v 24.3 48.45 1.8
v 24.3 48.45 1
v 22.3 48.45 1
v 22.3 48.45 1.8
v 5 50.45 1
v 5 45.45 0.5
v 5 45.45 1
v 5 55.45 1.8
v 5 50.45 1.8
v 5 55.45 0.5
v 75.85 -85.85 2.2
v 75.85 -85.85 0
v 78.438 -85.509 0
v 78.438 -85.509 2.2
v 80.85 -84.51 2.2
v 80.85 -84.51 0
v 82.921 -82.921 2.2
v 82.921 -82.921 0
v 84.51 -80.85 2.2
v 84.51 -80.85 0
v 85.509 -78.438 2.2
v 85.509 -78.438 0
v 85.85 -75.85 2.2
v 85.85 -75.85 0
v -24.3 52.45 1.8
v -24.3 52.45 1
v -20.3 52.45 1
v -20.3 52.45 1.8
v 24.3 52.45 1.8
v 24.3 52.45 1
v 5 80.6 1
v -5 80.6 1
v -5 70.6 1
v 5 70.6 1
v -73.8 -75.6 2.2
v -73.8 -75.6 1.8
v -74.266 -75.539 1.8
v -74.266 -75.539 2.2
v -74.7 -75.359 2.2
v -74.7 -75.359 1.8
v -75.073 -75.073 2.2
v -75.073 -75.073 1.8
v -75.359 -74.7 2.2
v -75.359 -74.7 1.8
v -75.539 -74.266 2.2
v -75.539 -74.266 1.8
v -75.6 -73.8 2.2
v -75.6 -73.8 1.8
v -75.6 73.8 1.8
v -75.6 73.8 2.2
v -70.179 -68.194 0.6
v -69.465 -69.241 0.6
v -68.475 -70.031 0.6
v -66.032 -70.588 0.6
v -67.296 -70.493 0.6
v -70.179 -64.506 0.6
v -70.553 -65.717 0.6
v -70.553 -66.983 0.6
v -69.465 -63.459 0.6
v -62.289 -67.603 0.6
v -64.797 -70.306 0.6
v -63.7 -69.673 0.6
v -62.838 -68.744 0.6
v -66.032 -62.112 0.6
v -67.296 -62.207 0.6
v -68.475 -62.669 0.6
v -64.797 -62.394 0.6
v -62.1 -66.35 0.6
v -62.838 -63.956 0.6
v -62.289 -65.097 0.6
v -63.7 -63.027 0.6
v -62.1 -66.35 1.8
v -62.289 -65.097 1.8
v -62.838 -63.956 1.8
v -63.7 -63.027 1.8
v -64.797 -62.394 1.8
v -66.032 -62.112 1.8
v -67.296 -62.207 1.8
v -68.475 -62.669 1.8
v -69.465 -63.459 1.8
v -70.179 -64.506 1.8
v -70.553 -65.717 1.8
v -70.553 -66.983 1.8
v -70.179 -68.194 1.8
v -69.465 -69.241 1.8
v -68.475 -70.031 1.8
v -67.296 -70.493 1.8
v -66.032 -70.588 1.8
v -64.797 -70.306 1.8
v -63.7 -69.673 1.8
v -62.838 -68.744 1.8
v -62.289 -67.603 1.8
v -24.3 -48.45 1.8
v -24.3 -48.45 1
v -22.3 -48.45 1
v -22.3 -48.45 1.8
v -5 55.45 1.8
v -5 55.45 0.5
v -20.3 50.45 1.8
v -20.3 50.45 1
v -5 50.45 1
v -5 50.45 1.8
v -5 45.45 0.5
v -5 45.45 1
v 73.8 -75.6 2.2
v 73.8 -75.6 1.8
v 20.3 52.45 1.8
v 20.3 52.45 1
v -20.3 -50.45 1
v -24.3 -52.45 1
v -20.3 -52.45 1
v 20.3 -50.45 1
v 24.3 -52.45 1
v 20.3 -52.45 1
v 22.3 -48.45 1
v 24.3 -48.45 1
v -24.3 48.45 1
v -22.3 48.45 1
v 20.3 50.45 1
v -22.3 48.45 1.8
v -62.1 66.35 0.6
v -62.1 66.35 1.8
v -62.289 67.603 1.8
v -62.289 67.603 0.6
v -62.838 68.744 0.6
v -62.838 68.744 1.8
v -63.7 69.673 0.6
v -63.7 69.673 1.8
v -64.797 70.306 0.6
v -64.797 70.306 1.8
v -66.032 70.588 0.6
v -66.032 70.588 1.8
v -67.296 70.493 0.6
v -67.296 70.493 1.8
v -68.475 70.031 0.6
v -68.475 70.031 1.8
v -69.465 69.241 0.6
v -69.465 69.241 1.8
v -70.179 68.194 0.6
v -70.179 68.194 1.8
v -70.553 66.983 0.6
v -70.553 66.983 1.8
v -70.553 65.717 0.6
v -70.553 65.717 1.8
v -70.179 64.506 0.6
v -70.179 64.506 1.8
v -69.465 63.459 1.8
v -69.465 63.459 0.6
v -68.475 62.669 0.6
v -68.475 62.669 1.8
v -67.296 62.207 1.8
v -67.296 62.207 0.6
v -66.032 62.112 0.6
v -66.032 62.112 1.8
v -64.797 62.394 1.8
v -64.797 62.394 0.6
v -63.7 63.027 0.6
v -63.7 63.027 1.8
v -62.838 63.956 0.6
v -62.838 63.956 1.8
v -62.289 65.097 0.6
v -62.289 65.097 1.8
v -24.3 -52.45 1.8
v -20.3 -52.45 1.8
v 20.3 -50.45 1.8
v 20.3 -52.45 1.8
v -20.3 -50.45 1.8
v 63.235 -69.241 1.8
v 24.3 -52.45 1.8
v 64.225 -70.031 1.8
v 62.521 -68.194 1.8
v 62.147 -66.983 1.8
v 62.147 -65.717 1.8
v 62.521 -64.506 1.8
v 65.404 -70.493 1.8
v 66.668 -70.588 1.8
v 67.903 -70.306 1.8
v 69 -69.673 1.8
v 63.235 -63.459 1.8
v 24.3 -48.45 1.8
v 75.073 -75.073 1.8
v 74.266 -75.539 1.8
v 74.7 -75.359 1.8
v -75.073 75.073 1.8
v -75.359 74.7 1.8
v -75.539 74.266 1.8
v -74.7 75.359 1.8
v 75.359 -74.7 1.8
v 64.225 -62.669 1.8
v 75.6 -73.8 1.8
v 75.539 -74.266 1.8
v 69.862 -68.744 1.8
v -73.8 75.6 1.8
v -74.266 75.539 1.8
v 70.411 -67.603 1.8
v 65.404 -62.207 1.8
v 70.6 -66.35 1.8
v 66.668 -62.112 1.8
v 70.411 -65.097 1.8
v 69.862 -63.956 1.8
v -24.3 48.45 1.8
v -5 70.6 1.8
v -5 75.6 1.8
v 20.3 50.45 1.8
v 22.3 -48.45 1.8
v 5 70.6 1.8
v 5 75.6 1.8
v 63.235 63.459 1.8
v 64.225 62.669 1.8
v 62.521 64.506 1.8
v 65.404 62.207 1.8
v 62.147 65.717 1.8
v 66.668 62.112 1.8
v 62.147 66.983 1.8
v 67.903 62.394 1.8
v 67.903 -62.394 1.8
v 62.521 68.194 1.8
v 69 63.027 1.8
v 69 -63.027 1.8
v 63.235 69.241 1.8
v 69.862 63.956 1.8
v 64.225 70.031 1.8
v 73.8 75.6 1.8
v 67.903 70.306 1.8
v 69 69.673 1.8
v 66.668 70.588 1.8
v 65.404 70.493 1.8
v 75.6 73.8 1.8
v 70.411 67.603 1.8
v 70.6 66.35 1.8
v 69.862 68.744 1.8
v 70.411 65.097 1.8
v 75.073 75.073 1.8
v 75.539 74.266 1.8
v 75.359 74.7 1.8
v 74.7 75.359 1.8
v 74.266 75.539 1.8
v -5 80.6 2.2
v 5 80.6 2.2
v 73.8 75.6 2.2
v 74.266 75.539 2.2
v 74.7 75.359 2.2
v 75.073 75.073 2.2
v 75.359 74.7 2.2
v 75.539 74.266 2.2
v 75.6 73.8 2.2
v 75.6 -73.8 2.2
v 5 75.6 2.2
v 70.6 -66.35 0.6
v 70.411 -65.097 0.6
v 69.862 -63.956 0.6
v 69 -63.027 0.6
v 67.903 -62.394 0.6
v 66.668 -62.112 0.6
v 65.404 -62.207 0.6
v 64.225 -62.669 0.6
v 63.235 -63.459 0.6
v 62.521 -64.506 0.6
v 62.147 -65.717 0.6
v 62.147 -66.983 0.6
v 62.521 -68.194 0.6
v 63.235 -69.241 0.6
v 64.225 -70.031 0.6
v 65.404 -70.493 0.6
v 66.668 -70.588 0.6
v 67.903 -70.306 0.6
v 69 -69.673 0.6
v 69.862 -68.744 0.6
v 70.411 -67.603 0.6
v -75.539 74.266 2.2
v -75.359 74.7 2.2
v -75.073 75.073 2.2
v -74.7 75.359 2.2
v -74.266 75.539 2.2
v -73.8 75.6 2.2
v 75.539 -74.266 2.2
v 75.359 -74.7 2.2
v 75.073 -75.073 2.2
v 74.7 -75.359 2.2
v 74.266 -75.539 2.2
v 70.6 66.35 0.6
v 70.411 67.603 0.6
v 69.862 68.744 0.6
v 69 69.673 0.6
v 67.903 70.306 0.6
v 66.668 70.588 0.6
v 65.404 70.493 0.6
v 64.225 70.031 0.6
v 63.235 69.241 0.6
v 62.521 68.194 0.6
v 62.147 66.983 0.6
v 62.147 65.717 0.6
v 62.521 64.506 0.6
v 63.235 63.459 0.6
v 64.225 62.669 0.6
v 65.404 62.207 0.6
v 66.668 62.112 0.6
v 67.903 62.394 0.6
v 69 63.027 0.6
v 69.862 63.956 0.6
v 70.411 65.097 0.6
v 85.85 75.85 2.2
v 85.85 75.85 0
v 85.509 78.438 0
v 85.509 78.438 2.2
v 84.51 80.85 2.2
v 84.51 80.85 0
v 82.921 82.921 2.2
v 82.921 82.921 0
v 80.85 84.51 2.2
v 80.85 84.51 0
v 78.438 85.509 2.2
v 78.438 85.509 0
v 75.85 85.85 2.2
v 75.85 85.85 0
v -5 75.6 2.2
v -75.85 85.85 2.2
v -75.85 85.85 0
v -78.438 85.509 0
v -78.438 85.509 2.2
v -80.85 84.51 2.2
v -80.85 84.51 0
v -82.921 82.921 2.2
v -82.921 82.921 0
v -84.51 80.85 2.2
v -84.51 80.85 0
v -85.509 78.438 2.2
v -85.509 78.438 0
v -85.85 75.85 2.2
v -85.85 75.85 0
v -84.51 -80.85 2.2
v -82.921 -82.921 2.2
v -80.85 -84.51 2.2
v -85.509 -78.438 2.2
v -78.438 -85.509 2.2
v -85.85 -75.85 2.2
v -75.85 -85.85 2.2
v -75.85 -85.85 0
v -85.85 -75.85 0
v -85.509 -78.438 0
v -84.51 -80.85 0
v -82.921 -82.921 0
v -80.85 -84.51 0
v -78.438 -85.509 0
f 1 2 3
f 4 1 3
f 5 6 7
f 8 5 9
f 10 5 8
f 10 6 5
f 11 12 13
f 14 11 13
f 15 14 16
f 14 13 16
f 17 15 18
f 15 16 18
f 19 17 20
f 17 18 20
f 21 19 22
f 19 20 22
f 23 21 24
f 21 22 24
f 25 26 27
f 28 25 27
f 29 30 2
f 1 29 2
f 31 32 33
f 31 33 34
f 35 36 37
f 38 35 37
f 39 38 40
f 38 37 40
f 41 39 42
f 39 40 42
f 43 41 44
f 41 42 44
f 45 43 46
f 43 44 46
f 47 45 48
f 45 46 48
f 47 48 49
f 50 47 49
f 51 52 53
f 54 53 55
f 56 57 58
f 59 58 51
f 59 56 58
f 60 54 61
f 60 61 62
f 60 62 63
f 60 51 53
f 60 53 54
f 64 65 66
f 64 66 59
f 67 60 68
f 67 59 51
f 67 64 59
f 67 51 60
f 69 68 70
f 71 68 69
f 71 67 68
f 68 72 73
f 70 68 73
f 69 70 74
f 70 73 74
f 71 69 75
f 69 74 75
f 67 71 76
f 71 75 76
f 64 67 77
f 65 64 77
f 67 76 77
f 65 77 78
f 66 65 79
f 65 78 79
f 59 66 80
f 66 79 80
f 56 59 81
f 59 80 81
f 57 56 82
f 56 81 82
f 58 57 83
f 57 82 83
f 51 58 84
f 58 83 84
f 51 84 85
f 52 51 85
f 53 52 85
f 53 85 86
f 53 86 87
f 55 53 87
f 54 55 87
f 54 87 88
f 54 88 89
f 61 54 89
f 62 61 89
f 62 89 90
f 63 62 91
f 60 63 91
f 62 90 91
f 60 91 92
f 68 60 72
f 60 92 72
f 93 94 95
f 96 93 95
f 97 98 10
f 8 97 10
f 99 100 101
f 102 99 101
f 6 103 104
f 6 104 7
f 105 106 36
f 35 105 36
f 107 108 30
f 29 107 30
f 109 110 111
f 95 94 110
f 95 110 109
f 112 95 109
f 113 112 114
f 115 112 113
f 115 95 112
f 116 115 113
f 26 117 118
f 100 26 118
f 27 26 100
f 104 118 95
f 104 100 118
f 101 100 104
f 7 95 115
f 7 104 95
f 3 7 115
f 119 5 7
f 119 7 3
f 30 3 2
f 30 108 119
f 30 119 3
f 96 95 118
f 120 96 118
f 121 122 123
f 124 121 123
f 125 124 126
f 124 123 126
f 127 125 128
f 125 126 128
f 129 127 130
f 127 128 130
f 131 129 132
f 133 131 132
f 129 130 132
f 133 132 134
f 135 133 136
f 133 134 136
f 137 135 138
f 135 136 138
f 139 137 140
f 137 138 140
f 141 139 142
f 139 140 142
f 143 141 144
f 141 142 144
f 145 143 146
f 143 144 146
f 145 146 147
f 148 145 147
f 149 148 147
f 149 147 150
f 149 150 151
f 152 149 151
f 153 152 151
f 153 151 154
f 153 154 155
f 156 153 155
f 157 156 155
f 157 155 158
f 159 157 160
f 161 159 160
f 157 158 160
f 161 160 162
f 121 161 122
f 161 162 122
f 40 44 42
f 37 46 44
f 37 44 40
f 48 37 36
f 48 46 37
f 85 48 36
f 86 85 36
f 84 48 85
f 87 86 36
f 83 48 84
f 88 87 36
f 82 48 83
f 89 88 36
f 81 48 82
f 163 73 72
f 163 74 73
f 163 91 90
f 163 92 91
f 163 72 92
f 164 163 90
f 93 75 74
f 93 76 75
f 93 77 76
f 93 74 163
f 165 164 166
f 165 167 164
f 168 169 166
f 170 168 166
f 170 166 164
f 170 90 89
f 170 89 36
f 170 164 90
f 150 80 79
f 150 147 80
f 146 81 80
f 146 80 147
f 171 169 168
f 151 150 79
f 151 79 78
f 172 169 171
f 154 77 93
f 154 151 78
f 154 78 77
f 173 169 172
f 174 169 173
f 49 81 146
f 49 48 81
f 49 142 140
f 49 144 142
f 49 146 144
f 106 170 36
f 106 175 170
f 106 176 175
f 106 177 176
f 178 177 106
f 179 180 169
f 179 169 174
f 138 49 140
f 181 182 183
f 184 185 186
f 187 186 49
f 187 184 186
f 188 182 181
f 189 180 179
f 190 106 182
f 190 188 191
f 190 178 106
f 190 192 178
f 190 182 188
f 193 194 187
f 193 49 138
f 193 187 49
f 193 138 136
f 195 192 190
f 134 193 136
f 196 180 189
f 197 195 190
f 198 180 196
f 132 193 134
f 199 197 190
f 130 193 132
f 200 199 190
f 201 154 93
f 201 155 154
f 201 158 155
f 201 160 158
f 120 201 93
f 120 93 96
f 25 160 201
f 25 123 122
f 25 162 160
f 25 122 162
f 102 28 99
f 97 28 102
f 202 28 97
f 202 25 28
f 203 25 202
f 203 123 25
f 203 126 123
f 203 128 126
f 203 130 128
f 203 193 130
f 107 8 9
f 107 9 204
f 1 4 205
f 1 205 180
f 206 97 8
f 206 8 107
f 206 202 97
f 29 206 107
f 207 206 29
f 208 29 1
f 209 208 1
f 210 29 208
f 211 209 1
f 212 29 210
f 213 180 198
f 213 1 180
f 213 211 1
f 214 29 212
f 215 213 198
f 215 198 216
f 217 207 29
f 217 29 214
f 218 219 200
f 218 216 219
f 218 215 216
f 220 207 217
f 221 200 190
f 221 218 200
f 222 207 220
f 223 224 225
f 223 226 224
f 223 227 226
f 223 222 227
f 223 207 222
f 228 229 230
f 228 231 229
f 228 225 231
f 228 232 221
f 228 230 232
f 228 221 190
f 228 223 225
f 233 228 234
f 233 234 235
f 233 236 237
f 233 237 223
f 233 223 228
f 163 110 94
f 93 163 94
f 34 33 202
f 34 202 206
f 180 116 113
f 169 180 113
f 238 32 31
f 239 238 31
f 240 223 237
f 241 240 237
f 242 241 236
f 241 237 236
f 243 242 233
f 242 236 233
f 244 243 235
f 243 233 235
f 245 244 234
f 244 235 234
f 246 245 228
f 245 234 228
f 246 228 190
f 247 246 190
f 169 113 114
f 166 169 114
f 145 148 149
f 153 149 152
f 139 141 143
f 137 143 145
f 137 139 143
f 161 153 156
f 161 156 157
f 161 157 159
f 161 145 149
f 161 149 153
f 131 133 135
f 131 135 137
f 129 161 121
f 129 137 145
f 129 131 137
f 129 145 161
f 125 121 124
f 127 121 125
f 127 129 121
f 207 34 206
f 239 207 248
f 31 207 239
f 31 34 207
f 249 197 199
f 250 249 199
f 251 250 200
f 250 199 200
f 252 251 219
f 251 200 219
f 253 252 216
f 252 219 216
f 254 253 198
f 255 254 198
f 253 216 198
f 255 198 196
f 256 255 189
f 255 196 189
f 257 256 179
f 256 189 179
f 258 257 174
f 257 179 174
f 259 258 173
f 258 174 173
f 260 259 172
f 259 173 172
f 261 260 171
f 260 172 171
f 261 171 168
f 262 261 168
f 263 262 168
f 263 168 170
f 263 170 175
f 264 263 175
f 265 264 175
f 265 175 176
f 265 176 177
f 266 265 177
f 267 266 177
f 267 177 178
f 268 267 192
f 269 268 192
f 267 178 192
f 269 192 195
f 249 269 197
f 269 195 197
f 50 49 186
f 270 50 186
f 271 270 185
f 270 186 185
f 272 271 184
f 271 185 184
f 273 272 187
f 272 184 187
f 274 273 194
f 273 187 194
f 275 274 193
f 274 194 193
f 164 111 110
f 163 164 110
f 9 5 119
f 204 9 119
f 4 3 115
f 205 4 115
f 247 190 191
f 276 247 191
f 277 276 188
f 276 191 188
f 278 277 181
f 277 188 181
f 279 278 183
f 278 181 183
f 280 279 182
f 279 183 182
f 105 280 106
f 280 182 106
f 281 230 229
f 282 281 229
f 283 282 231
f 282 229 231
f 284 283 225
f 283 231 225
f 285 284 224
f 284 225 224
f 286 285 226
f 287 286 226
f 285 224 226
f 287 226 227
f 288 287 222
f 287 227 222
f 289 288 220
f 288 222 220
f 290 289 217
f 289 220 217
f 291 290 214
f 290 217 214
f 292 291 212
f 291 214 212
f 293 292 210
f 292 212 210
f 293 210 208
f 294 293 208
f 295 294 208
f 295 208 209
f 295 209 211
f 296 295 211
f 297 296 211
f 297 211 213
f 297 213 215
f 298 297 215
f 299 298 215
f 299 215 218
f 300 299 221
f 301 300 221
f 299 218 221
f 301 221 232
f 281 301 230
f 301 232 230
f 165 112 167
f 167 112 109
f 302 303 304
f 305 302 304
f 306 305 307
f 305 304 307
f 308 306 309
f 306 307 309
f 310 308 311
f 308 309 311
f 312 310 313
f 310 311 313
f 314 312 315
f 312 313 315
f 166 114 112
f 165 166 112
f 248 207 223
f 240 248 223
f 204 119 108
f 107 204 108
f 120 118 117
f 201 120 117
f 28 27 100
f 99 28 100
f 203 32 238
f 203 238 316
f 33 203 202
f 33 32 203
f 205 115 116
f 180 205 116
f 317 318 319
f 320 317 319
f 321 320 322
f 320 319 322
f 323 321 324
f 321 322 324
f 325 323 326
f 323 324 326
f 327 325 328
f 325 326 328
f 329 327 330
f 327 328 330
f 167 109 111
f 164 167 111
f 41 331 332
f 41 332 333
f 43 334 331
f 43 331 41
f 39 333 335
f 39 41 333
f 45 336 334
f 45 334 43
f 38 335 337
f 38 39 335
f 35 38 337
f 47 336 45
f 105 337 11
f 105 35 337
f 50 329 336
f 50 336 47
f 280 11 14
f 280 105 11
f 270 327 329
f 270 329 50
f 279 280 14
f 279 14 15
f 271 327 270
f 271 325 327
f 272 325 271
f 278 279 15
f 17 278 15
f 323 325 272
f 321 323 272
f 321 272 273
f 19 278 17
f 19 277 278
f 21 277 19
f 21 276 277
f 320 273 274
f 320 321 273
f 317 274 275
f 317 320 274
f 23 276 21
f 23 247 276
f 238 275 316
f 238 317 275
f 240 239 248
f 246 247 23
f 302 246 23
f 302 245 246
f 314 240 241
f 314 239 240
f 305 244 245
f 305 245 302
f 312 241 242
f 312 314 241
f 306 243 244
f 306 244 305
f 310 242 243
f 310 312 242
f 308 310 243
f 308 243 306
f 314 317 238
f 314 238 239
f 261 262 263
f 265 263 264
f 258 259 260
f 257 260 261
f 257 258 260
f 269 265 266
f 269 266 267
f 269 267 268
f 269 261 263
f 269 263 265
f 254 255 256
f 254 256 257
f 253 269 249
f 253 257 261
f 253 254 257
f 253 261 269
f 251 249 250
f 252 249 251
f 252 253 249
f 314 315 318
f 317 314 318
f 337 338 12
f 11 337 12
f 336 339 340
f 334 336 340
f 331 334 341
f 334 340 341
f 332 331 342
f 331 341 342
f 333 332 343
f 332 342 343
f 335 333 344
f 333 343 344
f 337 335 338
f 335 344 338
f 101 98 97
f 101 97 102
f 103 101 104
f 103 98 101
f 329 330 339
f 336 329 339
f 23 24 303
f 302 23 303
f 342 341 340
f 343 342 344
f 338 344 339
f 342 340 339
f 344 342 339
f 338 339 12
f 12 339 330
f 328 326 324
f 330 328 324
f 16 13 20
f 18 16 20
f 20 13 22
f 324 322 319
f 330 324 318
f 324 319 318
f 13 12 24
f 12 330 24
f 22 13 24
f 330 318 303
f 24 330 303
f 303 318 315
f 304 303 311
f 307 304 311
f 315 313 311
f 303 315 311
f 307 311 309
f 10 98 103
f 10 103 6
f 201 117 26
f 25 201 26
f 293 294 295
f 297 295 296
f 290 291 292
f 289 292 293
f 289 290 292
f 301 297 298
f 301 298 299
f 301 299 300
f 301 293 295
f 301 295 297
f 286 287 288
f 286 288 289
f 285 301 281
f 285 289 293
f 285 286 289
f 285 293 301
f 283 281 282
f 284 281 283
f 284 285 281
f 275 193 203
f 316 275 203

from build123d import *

# Parameters (mm, degrees)
F0_W     = 10
F0_H     = 5
F1_DEPTH = 1
F2_DEPTH = 2.2
F3_DEPTH = 1.8
F4_START = 1
F4_DEPTH = 1.2
F5_START = 0.5
F5_DEPTH = 1.3
F6_R     = 4.25
F7_DEPTH = 1.2


with BuildPart() as f1:
    # F0 (on Top) → F1 (new body)
    with BuildSketch(Plane.XY):
        with BuildLine():
            Line((75.85, 85.85), (-75.85, 85.85))
            ThreePointArc((-75.85, 85.85), (-82.9210678119, 82.9210678119), (-85.85, 75.85))
            Line((-85.85, 75.85), (-85.85, -75.85))
            ThreePointArc((-85.85, -75.85), (-82.9210678119, -82.9210678119), (-75.85, -85.85))
            Line((-75.85, -85.85), (75.85, -85.85))
            ThreePointArc((75.85, -85.85), (82.9210678119, -82.9210678119), (85.85, -75.85))
            Line((85.85, -75.85), (85.85, 75.85))
            ThreePointArc((85.85, 75.85), (82.9210678119, 82.9210678119), (75.85, 85.85))
        make_face()
        with BuildLine():
            Line((5, 75.6), (73.8, 75.6))
            ThreePointArc((73.8, 75.6), (75.0727922061, 75.0727922061), (75.6, 73.8))
            Line((75.6, 73.8), (75.6, -73.8))
            ThreePointArc((75.6, -73.8), (75.0727922061, -75.0727922061), (73.8, -75.6))
            Line((73.8, -75.6), (-73.8, -75.6))
            ThreePointArc((-73.8, -75.6), (-75.0727922061, -75.0727922061), (-75.6, -73.8))
            Line((-75.6, -73.8), (-75.6, 73.8))
            ThreePointArc((-75.6, 73.8), (-75.0727922061, 75.0727922061), (-73.8, 75.6))
            Line((-73.8, 75.6), (-5, 75.6))
            Line((-5, 75.6), (-5, 80.6))
            Line((-5, 80.6), (5, 80.6))
            Line((5, 80.6), (5, 75.6))
        make_face(mode=Mode.SUBTRACT)
        with BuildLine():
            ThreePointArc((75.6, 73.8), (75.0727922061, 75.0727922061), (73.8, 75.6))
            Line((73.8, 75.6), (5, 75.6))
            Line((5, 75.6), (5, 70.6))
            Line((5, 70.6), (-5, 70.6))
            Line((-5, 70.6), (-5, 75.6))
            Line((-5, 75.6), (-73.8, 75.6))
            ThreePointArc((-73.8, 75.6), (-75.0727922061, 75.0727922061), (-75.6, 73.8))
            Line((-75.6, 73.8), (-75.6, -73.8))
            ThreePointArc((-75.6, -73.8), (-75.0727922061, -75.0727922061), (-73.8, -75.6))
            Line((-73.8, -75.6), (73.8, -75.6))
            ThreePointArc((73.8, -75.6), (75.0727922061, -75.0727922061), (75.6, -73.8))
            Line((75.6, -73.8), (75.6, 73.8))
        make_face()
        Polygon((-20.3, 52.45), (-20.3, 50.45), (-5, 50.45), (-5, 55.45), (5, 55.45), (5, 50.45), (20.3, 50.45), (20.3, 52.45), (24.3, 52.45), (24.3, 48.45), (22.3, 48.45), (22.3, -48.45), (24.3, -48.45), (24.3, -52.45), (20.3, -52.45), (20.3, -50.45), (-20.3, -50.45), (-20.3, -52.45), (-24.3, -52.45), (-24.3, -48.45), (-22.3, -48.45), (-22.3, 48.45), (-24.3, 48.45), (-24.3, 52.45), align=None, mode=Mode.SUBTRACT)
        Polygon((-5, 50.45), (-20.3, 50.45), (-20.3, 52.45), (-24.3, 52.45), (-24.3, 48.45), (-22.3, 48.45), (-22.3, -48.45), (-24.3, -48.45), (-24.3, -52.45), (-20.3, -52.45), (-20.3, -50.45), (20.3, -50.45), (20.3, -52.45), (24.3, -52.45), (24.3, -48.45), (22.3, -48.45), (22.3, 48.45), (24.3, 48.45), (24.3, 52.45), (20.3, 52.45), (20.3, 50.45), (5, 50.45), (5, 45.45), (-5, 45.45), align=None)
        with Locations((0, 78.1)):
            Rectangle(F0_W, F0_H)
        with Locations((0, 52.95)):
            Rectangle(F0_W, F0_H)
        with Locations((0, 73.1)):
            Rectangle(F0_W, F0_H)
        with Locations((0, 47.95)):
            Rectangle(F0_W, F0_H)
    extrude(amount=F1_DEPTH)

    # F0 (on Top) → F2 (join)
    with BuildSketch(Plane.XY):
        with BuildLine():
            Line((75.85, 85.85), (-75.85, 85.85))
            ThreePointArc((-75.85, 85.85), (-82.9210678119, 82.9210678119), (-85.85, 75.85))
            Line((-85.85, 75.85), (-85.85, -75.85))
            ThreePointArc((-85.85, -75.85), (-82.9210678119, -82.9210678119), (-75.85, -85.85))
            Line((-75.85, -85.85), (75.85, -85.85))
            ThreePointArc((75.85, -85.85), (82.9210678119, -82.9210678119), (85.85, -75.85))
            Line((85.85, -75.85), (85.85, 75.85))
            ThreePointArc((85.85, 75.85), (82.9210678119, 82.9210678119), (75.85, 85.85))
        make_face()
        with BuildLine():
            Line((5, 75.6), (73.8, 75.6))
            ThreePointArc((73.8, 75.6), (75.0727922061, 75.0727922061), (75.6, 73.8))
            Line((75.6, 73.8), (75.6, -73.8))
            ThreePointArc((75.6, -73.8), (75.0727922061, -75.0727922061), (73.8, -75.6))
            Line((73.8, -75.6), (-73.8, -75.6))
            ThreePointArc((-73.8, -75.6), (-75.0727922061, -75.0727922061), (-75.6, -73.8))
            Line((-75.6, -73.8), (-75.6, 73.8))
            ThreePointArc((-75.6, 73.8), (-75.0727922061, 75.0727922061), (-73.8, 75.6))
            Line((-73.8, 75.6), (-5, 75.6))
            Line((-5, 75.6), (-5, 80.6))
            Line((-5, 80.6), (5, 80.6))
            Line((5, 80.6), (5, 75.6))
        make_face(mode=Mode.SUBTRACT)
        with Locations((0, 78.1)):
            Rectangle(F0_W, F0_H)
    extrude(amount=F2_DEPTH)

    # F0 (on Top) → F3 (join)
    with BuildSketch(Plane.XY):
        with BuildLine():
            ThreePointArc((75.6, 73.8), (75.0727922061, 75.0727922061), (73.8, 75.6))
            Line((73.8, 75.6), (5, 75.6))
            Line((5, 75.6), (5, 70.6))
            Line((5, 70.6), (-5, 70.6))
            Line((-5, 70.6), (-5, 75.6))
            Line((-5, 75.6), (-73.8, 75.6))
            ThreePointArc((-73.8, 75.6), (-75.0727922061, 75.0727922061), (-75.6, 73.8))
            Line((-75.6, 73.8), (-75.6, -73.8))
            ThreePointArc((-75.6, -73.8), (-75.0727922061, -75.0727922061), (-73.8, -75.6))
            Line((-73.8, -75.6), (73.8, -75.6))
            ThreePointArc((73.8, -75.6), (75.0727922061, -75.0727922061), (75.6, -73.8))
            Line((75.6, -73.8), (75.6, 73.8))
        make_face()
        Polygon((-20.3, 52.45), (-20.3, 50.45), (-5, 50.45), (-5, 55.45), (5, 55.45), (5, 50.45), (20.3, 50.45), (20.3, 52.45), (24.3, 52.45), (24.3, 48.45), (22.3, 48.45), (22.3, -48.45), (24.3, -48.45), (24.3, -52.45), (20.3, -52.45), (20.3, -50.45), (-20.3, -50.45), (-20.3, -52.45), (-24.3, -52.45), (-24.3, -48.45), (-22.3, -48.45), (-22.3, 48.45), (-24.3, 48.45), (-24.3, 52.45), align=None, mode=Mode.SUBTRACT)
        with Locations((0, 73.1)):
            Rectangle(F0_W, F0_H)
        with Locations((0, 52.95)):
            Rectangle(F0_W, F0_H)
    extrude(amount=F3_DEPTH)

    # F0 (on Top) → F4 (cut)
    with BuildSketch(Plane.XY.offset(F4_START)):
        with Locations((0, 78.1)):
            Rectangle(F0_W, F0_H)
        with Locations((0, 73.1)):
            Rectangle(F0_W, F0_H)
    extrude(amount=F4_DEPTH, mode=Mode.SUBTRACT)

    # F0 (on Top) → F5 (cut)
    with BuildSketch(Plane.XY.offset(F5_START)):
        with Locations((0, 52.95)):
            Rectangle(F0_W, F0_H)
        with Locations((0, 47.95)):
            Rectangle(F0_W, F0_H)
    extrude(amount=F5_DEPTH, mode=Mode.SUBTRACT)

    # F6 (on face) → F7 (cut)
    with BuildSketch(Plane.XY.offset(1.8)):
        with Locations((-66.35, 66.35)):
            Circle(F6_R)
        with Locations((66.35, 66.35)):
            Circle(F6_R)
        with Locations((66.35, -66.35)):
            Circle(F6_R)
        with Locations((-66.35, -66.35)):
            Circle(F6_R)
    extrude(amount=-F7_DEPTH, mode=Mode.SUBTRACT)


solid = f1.part
